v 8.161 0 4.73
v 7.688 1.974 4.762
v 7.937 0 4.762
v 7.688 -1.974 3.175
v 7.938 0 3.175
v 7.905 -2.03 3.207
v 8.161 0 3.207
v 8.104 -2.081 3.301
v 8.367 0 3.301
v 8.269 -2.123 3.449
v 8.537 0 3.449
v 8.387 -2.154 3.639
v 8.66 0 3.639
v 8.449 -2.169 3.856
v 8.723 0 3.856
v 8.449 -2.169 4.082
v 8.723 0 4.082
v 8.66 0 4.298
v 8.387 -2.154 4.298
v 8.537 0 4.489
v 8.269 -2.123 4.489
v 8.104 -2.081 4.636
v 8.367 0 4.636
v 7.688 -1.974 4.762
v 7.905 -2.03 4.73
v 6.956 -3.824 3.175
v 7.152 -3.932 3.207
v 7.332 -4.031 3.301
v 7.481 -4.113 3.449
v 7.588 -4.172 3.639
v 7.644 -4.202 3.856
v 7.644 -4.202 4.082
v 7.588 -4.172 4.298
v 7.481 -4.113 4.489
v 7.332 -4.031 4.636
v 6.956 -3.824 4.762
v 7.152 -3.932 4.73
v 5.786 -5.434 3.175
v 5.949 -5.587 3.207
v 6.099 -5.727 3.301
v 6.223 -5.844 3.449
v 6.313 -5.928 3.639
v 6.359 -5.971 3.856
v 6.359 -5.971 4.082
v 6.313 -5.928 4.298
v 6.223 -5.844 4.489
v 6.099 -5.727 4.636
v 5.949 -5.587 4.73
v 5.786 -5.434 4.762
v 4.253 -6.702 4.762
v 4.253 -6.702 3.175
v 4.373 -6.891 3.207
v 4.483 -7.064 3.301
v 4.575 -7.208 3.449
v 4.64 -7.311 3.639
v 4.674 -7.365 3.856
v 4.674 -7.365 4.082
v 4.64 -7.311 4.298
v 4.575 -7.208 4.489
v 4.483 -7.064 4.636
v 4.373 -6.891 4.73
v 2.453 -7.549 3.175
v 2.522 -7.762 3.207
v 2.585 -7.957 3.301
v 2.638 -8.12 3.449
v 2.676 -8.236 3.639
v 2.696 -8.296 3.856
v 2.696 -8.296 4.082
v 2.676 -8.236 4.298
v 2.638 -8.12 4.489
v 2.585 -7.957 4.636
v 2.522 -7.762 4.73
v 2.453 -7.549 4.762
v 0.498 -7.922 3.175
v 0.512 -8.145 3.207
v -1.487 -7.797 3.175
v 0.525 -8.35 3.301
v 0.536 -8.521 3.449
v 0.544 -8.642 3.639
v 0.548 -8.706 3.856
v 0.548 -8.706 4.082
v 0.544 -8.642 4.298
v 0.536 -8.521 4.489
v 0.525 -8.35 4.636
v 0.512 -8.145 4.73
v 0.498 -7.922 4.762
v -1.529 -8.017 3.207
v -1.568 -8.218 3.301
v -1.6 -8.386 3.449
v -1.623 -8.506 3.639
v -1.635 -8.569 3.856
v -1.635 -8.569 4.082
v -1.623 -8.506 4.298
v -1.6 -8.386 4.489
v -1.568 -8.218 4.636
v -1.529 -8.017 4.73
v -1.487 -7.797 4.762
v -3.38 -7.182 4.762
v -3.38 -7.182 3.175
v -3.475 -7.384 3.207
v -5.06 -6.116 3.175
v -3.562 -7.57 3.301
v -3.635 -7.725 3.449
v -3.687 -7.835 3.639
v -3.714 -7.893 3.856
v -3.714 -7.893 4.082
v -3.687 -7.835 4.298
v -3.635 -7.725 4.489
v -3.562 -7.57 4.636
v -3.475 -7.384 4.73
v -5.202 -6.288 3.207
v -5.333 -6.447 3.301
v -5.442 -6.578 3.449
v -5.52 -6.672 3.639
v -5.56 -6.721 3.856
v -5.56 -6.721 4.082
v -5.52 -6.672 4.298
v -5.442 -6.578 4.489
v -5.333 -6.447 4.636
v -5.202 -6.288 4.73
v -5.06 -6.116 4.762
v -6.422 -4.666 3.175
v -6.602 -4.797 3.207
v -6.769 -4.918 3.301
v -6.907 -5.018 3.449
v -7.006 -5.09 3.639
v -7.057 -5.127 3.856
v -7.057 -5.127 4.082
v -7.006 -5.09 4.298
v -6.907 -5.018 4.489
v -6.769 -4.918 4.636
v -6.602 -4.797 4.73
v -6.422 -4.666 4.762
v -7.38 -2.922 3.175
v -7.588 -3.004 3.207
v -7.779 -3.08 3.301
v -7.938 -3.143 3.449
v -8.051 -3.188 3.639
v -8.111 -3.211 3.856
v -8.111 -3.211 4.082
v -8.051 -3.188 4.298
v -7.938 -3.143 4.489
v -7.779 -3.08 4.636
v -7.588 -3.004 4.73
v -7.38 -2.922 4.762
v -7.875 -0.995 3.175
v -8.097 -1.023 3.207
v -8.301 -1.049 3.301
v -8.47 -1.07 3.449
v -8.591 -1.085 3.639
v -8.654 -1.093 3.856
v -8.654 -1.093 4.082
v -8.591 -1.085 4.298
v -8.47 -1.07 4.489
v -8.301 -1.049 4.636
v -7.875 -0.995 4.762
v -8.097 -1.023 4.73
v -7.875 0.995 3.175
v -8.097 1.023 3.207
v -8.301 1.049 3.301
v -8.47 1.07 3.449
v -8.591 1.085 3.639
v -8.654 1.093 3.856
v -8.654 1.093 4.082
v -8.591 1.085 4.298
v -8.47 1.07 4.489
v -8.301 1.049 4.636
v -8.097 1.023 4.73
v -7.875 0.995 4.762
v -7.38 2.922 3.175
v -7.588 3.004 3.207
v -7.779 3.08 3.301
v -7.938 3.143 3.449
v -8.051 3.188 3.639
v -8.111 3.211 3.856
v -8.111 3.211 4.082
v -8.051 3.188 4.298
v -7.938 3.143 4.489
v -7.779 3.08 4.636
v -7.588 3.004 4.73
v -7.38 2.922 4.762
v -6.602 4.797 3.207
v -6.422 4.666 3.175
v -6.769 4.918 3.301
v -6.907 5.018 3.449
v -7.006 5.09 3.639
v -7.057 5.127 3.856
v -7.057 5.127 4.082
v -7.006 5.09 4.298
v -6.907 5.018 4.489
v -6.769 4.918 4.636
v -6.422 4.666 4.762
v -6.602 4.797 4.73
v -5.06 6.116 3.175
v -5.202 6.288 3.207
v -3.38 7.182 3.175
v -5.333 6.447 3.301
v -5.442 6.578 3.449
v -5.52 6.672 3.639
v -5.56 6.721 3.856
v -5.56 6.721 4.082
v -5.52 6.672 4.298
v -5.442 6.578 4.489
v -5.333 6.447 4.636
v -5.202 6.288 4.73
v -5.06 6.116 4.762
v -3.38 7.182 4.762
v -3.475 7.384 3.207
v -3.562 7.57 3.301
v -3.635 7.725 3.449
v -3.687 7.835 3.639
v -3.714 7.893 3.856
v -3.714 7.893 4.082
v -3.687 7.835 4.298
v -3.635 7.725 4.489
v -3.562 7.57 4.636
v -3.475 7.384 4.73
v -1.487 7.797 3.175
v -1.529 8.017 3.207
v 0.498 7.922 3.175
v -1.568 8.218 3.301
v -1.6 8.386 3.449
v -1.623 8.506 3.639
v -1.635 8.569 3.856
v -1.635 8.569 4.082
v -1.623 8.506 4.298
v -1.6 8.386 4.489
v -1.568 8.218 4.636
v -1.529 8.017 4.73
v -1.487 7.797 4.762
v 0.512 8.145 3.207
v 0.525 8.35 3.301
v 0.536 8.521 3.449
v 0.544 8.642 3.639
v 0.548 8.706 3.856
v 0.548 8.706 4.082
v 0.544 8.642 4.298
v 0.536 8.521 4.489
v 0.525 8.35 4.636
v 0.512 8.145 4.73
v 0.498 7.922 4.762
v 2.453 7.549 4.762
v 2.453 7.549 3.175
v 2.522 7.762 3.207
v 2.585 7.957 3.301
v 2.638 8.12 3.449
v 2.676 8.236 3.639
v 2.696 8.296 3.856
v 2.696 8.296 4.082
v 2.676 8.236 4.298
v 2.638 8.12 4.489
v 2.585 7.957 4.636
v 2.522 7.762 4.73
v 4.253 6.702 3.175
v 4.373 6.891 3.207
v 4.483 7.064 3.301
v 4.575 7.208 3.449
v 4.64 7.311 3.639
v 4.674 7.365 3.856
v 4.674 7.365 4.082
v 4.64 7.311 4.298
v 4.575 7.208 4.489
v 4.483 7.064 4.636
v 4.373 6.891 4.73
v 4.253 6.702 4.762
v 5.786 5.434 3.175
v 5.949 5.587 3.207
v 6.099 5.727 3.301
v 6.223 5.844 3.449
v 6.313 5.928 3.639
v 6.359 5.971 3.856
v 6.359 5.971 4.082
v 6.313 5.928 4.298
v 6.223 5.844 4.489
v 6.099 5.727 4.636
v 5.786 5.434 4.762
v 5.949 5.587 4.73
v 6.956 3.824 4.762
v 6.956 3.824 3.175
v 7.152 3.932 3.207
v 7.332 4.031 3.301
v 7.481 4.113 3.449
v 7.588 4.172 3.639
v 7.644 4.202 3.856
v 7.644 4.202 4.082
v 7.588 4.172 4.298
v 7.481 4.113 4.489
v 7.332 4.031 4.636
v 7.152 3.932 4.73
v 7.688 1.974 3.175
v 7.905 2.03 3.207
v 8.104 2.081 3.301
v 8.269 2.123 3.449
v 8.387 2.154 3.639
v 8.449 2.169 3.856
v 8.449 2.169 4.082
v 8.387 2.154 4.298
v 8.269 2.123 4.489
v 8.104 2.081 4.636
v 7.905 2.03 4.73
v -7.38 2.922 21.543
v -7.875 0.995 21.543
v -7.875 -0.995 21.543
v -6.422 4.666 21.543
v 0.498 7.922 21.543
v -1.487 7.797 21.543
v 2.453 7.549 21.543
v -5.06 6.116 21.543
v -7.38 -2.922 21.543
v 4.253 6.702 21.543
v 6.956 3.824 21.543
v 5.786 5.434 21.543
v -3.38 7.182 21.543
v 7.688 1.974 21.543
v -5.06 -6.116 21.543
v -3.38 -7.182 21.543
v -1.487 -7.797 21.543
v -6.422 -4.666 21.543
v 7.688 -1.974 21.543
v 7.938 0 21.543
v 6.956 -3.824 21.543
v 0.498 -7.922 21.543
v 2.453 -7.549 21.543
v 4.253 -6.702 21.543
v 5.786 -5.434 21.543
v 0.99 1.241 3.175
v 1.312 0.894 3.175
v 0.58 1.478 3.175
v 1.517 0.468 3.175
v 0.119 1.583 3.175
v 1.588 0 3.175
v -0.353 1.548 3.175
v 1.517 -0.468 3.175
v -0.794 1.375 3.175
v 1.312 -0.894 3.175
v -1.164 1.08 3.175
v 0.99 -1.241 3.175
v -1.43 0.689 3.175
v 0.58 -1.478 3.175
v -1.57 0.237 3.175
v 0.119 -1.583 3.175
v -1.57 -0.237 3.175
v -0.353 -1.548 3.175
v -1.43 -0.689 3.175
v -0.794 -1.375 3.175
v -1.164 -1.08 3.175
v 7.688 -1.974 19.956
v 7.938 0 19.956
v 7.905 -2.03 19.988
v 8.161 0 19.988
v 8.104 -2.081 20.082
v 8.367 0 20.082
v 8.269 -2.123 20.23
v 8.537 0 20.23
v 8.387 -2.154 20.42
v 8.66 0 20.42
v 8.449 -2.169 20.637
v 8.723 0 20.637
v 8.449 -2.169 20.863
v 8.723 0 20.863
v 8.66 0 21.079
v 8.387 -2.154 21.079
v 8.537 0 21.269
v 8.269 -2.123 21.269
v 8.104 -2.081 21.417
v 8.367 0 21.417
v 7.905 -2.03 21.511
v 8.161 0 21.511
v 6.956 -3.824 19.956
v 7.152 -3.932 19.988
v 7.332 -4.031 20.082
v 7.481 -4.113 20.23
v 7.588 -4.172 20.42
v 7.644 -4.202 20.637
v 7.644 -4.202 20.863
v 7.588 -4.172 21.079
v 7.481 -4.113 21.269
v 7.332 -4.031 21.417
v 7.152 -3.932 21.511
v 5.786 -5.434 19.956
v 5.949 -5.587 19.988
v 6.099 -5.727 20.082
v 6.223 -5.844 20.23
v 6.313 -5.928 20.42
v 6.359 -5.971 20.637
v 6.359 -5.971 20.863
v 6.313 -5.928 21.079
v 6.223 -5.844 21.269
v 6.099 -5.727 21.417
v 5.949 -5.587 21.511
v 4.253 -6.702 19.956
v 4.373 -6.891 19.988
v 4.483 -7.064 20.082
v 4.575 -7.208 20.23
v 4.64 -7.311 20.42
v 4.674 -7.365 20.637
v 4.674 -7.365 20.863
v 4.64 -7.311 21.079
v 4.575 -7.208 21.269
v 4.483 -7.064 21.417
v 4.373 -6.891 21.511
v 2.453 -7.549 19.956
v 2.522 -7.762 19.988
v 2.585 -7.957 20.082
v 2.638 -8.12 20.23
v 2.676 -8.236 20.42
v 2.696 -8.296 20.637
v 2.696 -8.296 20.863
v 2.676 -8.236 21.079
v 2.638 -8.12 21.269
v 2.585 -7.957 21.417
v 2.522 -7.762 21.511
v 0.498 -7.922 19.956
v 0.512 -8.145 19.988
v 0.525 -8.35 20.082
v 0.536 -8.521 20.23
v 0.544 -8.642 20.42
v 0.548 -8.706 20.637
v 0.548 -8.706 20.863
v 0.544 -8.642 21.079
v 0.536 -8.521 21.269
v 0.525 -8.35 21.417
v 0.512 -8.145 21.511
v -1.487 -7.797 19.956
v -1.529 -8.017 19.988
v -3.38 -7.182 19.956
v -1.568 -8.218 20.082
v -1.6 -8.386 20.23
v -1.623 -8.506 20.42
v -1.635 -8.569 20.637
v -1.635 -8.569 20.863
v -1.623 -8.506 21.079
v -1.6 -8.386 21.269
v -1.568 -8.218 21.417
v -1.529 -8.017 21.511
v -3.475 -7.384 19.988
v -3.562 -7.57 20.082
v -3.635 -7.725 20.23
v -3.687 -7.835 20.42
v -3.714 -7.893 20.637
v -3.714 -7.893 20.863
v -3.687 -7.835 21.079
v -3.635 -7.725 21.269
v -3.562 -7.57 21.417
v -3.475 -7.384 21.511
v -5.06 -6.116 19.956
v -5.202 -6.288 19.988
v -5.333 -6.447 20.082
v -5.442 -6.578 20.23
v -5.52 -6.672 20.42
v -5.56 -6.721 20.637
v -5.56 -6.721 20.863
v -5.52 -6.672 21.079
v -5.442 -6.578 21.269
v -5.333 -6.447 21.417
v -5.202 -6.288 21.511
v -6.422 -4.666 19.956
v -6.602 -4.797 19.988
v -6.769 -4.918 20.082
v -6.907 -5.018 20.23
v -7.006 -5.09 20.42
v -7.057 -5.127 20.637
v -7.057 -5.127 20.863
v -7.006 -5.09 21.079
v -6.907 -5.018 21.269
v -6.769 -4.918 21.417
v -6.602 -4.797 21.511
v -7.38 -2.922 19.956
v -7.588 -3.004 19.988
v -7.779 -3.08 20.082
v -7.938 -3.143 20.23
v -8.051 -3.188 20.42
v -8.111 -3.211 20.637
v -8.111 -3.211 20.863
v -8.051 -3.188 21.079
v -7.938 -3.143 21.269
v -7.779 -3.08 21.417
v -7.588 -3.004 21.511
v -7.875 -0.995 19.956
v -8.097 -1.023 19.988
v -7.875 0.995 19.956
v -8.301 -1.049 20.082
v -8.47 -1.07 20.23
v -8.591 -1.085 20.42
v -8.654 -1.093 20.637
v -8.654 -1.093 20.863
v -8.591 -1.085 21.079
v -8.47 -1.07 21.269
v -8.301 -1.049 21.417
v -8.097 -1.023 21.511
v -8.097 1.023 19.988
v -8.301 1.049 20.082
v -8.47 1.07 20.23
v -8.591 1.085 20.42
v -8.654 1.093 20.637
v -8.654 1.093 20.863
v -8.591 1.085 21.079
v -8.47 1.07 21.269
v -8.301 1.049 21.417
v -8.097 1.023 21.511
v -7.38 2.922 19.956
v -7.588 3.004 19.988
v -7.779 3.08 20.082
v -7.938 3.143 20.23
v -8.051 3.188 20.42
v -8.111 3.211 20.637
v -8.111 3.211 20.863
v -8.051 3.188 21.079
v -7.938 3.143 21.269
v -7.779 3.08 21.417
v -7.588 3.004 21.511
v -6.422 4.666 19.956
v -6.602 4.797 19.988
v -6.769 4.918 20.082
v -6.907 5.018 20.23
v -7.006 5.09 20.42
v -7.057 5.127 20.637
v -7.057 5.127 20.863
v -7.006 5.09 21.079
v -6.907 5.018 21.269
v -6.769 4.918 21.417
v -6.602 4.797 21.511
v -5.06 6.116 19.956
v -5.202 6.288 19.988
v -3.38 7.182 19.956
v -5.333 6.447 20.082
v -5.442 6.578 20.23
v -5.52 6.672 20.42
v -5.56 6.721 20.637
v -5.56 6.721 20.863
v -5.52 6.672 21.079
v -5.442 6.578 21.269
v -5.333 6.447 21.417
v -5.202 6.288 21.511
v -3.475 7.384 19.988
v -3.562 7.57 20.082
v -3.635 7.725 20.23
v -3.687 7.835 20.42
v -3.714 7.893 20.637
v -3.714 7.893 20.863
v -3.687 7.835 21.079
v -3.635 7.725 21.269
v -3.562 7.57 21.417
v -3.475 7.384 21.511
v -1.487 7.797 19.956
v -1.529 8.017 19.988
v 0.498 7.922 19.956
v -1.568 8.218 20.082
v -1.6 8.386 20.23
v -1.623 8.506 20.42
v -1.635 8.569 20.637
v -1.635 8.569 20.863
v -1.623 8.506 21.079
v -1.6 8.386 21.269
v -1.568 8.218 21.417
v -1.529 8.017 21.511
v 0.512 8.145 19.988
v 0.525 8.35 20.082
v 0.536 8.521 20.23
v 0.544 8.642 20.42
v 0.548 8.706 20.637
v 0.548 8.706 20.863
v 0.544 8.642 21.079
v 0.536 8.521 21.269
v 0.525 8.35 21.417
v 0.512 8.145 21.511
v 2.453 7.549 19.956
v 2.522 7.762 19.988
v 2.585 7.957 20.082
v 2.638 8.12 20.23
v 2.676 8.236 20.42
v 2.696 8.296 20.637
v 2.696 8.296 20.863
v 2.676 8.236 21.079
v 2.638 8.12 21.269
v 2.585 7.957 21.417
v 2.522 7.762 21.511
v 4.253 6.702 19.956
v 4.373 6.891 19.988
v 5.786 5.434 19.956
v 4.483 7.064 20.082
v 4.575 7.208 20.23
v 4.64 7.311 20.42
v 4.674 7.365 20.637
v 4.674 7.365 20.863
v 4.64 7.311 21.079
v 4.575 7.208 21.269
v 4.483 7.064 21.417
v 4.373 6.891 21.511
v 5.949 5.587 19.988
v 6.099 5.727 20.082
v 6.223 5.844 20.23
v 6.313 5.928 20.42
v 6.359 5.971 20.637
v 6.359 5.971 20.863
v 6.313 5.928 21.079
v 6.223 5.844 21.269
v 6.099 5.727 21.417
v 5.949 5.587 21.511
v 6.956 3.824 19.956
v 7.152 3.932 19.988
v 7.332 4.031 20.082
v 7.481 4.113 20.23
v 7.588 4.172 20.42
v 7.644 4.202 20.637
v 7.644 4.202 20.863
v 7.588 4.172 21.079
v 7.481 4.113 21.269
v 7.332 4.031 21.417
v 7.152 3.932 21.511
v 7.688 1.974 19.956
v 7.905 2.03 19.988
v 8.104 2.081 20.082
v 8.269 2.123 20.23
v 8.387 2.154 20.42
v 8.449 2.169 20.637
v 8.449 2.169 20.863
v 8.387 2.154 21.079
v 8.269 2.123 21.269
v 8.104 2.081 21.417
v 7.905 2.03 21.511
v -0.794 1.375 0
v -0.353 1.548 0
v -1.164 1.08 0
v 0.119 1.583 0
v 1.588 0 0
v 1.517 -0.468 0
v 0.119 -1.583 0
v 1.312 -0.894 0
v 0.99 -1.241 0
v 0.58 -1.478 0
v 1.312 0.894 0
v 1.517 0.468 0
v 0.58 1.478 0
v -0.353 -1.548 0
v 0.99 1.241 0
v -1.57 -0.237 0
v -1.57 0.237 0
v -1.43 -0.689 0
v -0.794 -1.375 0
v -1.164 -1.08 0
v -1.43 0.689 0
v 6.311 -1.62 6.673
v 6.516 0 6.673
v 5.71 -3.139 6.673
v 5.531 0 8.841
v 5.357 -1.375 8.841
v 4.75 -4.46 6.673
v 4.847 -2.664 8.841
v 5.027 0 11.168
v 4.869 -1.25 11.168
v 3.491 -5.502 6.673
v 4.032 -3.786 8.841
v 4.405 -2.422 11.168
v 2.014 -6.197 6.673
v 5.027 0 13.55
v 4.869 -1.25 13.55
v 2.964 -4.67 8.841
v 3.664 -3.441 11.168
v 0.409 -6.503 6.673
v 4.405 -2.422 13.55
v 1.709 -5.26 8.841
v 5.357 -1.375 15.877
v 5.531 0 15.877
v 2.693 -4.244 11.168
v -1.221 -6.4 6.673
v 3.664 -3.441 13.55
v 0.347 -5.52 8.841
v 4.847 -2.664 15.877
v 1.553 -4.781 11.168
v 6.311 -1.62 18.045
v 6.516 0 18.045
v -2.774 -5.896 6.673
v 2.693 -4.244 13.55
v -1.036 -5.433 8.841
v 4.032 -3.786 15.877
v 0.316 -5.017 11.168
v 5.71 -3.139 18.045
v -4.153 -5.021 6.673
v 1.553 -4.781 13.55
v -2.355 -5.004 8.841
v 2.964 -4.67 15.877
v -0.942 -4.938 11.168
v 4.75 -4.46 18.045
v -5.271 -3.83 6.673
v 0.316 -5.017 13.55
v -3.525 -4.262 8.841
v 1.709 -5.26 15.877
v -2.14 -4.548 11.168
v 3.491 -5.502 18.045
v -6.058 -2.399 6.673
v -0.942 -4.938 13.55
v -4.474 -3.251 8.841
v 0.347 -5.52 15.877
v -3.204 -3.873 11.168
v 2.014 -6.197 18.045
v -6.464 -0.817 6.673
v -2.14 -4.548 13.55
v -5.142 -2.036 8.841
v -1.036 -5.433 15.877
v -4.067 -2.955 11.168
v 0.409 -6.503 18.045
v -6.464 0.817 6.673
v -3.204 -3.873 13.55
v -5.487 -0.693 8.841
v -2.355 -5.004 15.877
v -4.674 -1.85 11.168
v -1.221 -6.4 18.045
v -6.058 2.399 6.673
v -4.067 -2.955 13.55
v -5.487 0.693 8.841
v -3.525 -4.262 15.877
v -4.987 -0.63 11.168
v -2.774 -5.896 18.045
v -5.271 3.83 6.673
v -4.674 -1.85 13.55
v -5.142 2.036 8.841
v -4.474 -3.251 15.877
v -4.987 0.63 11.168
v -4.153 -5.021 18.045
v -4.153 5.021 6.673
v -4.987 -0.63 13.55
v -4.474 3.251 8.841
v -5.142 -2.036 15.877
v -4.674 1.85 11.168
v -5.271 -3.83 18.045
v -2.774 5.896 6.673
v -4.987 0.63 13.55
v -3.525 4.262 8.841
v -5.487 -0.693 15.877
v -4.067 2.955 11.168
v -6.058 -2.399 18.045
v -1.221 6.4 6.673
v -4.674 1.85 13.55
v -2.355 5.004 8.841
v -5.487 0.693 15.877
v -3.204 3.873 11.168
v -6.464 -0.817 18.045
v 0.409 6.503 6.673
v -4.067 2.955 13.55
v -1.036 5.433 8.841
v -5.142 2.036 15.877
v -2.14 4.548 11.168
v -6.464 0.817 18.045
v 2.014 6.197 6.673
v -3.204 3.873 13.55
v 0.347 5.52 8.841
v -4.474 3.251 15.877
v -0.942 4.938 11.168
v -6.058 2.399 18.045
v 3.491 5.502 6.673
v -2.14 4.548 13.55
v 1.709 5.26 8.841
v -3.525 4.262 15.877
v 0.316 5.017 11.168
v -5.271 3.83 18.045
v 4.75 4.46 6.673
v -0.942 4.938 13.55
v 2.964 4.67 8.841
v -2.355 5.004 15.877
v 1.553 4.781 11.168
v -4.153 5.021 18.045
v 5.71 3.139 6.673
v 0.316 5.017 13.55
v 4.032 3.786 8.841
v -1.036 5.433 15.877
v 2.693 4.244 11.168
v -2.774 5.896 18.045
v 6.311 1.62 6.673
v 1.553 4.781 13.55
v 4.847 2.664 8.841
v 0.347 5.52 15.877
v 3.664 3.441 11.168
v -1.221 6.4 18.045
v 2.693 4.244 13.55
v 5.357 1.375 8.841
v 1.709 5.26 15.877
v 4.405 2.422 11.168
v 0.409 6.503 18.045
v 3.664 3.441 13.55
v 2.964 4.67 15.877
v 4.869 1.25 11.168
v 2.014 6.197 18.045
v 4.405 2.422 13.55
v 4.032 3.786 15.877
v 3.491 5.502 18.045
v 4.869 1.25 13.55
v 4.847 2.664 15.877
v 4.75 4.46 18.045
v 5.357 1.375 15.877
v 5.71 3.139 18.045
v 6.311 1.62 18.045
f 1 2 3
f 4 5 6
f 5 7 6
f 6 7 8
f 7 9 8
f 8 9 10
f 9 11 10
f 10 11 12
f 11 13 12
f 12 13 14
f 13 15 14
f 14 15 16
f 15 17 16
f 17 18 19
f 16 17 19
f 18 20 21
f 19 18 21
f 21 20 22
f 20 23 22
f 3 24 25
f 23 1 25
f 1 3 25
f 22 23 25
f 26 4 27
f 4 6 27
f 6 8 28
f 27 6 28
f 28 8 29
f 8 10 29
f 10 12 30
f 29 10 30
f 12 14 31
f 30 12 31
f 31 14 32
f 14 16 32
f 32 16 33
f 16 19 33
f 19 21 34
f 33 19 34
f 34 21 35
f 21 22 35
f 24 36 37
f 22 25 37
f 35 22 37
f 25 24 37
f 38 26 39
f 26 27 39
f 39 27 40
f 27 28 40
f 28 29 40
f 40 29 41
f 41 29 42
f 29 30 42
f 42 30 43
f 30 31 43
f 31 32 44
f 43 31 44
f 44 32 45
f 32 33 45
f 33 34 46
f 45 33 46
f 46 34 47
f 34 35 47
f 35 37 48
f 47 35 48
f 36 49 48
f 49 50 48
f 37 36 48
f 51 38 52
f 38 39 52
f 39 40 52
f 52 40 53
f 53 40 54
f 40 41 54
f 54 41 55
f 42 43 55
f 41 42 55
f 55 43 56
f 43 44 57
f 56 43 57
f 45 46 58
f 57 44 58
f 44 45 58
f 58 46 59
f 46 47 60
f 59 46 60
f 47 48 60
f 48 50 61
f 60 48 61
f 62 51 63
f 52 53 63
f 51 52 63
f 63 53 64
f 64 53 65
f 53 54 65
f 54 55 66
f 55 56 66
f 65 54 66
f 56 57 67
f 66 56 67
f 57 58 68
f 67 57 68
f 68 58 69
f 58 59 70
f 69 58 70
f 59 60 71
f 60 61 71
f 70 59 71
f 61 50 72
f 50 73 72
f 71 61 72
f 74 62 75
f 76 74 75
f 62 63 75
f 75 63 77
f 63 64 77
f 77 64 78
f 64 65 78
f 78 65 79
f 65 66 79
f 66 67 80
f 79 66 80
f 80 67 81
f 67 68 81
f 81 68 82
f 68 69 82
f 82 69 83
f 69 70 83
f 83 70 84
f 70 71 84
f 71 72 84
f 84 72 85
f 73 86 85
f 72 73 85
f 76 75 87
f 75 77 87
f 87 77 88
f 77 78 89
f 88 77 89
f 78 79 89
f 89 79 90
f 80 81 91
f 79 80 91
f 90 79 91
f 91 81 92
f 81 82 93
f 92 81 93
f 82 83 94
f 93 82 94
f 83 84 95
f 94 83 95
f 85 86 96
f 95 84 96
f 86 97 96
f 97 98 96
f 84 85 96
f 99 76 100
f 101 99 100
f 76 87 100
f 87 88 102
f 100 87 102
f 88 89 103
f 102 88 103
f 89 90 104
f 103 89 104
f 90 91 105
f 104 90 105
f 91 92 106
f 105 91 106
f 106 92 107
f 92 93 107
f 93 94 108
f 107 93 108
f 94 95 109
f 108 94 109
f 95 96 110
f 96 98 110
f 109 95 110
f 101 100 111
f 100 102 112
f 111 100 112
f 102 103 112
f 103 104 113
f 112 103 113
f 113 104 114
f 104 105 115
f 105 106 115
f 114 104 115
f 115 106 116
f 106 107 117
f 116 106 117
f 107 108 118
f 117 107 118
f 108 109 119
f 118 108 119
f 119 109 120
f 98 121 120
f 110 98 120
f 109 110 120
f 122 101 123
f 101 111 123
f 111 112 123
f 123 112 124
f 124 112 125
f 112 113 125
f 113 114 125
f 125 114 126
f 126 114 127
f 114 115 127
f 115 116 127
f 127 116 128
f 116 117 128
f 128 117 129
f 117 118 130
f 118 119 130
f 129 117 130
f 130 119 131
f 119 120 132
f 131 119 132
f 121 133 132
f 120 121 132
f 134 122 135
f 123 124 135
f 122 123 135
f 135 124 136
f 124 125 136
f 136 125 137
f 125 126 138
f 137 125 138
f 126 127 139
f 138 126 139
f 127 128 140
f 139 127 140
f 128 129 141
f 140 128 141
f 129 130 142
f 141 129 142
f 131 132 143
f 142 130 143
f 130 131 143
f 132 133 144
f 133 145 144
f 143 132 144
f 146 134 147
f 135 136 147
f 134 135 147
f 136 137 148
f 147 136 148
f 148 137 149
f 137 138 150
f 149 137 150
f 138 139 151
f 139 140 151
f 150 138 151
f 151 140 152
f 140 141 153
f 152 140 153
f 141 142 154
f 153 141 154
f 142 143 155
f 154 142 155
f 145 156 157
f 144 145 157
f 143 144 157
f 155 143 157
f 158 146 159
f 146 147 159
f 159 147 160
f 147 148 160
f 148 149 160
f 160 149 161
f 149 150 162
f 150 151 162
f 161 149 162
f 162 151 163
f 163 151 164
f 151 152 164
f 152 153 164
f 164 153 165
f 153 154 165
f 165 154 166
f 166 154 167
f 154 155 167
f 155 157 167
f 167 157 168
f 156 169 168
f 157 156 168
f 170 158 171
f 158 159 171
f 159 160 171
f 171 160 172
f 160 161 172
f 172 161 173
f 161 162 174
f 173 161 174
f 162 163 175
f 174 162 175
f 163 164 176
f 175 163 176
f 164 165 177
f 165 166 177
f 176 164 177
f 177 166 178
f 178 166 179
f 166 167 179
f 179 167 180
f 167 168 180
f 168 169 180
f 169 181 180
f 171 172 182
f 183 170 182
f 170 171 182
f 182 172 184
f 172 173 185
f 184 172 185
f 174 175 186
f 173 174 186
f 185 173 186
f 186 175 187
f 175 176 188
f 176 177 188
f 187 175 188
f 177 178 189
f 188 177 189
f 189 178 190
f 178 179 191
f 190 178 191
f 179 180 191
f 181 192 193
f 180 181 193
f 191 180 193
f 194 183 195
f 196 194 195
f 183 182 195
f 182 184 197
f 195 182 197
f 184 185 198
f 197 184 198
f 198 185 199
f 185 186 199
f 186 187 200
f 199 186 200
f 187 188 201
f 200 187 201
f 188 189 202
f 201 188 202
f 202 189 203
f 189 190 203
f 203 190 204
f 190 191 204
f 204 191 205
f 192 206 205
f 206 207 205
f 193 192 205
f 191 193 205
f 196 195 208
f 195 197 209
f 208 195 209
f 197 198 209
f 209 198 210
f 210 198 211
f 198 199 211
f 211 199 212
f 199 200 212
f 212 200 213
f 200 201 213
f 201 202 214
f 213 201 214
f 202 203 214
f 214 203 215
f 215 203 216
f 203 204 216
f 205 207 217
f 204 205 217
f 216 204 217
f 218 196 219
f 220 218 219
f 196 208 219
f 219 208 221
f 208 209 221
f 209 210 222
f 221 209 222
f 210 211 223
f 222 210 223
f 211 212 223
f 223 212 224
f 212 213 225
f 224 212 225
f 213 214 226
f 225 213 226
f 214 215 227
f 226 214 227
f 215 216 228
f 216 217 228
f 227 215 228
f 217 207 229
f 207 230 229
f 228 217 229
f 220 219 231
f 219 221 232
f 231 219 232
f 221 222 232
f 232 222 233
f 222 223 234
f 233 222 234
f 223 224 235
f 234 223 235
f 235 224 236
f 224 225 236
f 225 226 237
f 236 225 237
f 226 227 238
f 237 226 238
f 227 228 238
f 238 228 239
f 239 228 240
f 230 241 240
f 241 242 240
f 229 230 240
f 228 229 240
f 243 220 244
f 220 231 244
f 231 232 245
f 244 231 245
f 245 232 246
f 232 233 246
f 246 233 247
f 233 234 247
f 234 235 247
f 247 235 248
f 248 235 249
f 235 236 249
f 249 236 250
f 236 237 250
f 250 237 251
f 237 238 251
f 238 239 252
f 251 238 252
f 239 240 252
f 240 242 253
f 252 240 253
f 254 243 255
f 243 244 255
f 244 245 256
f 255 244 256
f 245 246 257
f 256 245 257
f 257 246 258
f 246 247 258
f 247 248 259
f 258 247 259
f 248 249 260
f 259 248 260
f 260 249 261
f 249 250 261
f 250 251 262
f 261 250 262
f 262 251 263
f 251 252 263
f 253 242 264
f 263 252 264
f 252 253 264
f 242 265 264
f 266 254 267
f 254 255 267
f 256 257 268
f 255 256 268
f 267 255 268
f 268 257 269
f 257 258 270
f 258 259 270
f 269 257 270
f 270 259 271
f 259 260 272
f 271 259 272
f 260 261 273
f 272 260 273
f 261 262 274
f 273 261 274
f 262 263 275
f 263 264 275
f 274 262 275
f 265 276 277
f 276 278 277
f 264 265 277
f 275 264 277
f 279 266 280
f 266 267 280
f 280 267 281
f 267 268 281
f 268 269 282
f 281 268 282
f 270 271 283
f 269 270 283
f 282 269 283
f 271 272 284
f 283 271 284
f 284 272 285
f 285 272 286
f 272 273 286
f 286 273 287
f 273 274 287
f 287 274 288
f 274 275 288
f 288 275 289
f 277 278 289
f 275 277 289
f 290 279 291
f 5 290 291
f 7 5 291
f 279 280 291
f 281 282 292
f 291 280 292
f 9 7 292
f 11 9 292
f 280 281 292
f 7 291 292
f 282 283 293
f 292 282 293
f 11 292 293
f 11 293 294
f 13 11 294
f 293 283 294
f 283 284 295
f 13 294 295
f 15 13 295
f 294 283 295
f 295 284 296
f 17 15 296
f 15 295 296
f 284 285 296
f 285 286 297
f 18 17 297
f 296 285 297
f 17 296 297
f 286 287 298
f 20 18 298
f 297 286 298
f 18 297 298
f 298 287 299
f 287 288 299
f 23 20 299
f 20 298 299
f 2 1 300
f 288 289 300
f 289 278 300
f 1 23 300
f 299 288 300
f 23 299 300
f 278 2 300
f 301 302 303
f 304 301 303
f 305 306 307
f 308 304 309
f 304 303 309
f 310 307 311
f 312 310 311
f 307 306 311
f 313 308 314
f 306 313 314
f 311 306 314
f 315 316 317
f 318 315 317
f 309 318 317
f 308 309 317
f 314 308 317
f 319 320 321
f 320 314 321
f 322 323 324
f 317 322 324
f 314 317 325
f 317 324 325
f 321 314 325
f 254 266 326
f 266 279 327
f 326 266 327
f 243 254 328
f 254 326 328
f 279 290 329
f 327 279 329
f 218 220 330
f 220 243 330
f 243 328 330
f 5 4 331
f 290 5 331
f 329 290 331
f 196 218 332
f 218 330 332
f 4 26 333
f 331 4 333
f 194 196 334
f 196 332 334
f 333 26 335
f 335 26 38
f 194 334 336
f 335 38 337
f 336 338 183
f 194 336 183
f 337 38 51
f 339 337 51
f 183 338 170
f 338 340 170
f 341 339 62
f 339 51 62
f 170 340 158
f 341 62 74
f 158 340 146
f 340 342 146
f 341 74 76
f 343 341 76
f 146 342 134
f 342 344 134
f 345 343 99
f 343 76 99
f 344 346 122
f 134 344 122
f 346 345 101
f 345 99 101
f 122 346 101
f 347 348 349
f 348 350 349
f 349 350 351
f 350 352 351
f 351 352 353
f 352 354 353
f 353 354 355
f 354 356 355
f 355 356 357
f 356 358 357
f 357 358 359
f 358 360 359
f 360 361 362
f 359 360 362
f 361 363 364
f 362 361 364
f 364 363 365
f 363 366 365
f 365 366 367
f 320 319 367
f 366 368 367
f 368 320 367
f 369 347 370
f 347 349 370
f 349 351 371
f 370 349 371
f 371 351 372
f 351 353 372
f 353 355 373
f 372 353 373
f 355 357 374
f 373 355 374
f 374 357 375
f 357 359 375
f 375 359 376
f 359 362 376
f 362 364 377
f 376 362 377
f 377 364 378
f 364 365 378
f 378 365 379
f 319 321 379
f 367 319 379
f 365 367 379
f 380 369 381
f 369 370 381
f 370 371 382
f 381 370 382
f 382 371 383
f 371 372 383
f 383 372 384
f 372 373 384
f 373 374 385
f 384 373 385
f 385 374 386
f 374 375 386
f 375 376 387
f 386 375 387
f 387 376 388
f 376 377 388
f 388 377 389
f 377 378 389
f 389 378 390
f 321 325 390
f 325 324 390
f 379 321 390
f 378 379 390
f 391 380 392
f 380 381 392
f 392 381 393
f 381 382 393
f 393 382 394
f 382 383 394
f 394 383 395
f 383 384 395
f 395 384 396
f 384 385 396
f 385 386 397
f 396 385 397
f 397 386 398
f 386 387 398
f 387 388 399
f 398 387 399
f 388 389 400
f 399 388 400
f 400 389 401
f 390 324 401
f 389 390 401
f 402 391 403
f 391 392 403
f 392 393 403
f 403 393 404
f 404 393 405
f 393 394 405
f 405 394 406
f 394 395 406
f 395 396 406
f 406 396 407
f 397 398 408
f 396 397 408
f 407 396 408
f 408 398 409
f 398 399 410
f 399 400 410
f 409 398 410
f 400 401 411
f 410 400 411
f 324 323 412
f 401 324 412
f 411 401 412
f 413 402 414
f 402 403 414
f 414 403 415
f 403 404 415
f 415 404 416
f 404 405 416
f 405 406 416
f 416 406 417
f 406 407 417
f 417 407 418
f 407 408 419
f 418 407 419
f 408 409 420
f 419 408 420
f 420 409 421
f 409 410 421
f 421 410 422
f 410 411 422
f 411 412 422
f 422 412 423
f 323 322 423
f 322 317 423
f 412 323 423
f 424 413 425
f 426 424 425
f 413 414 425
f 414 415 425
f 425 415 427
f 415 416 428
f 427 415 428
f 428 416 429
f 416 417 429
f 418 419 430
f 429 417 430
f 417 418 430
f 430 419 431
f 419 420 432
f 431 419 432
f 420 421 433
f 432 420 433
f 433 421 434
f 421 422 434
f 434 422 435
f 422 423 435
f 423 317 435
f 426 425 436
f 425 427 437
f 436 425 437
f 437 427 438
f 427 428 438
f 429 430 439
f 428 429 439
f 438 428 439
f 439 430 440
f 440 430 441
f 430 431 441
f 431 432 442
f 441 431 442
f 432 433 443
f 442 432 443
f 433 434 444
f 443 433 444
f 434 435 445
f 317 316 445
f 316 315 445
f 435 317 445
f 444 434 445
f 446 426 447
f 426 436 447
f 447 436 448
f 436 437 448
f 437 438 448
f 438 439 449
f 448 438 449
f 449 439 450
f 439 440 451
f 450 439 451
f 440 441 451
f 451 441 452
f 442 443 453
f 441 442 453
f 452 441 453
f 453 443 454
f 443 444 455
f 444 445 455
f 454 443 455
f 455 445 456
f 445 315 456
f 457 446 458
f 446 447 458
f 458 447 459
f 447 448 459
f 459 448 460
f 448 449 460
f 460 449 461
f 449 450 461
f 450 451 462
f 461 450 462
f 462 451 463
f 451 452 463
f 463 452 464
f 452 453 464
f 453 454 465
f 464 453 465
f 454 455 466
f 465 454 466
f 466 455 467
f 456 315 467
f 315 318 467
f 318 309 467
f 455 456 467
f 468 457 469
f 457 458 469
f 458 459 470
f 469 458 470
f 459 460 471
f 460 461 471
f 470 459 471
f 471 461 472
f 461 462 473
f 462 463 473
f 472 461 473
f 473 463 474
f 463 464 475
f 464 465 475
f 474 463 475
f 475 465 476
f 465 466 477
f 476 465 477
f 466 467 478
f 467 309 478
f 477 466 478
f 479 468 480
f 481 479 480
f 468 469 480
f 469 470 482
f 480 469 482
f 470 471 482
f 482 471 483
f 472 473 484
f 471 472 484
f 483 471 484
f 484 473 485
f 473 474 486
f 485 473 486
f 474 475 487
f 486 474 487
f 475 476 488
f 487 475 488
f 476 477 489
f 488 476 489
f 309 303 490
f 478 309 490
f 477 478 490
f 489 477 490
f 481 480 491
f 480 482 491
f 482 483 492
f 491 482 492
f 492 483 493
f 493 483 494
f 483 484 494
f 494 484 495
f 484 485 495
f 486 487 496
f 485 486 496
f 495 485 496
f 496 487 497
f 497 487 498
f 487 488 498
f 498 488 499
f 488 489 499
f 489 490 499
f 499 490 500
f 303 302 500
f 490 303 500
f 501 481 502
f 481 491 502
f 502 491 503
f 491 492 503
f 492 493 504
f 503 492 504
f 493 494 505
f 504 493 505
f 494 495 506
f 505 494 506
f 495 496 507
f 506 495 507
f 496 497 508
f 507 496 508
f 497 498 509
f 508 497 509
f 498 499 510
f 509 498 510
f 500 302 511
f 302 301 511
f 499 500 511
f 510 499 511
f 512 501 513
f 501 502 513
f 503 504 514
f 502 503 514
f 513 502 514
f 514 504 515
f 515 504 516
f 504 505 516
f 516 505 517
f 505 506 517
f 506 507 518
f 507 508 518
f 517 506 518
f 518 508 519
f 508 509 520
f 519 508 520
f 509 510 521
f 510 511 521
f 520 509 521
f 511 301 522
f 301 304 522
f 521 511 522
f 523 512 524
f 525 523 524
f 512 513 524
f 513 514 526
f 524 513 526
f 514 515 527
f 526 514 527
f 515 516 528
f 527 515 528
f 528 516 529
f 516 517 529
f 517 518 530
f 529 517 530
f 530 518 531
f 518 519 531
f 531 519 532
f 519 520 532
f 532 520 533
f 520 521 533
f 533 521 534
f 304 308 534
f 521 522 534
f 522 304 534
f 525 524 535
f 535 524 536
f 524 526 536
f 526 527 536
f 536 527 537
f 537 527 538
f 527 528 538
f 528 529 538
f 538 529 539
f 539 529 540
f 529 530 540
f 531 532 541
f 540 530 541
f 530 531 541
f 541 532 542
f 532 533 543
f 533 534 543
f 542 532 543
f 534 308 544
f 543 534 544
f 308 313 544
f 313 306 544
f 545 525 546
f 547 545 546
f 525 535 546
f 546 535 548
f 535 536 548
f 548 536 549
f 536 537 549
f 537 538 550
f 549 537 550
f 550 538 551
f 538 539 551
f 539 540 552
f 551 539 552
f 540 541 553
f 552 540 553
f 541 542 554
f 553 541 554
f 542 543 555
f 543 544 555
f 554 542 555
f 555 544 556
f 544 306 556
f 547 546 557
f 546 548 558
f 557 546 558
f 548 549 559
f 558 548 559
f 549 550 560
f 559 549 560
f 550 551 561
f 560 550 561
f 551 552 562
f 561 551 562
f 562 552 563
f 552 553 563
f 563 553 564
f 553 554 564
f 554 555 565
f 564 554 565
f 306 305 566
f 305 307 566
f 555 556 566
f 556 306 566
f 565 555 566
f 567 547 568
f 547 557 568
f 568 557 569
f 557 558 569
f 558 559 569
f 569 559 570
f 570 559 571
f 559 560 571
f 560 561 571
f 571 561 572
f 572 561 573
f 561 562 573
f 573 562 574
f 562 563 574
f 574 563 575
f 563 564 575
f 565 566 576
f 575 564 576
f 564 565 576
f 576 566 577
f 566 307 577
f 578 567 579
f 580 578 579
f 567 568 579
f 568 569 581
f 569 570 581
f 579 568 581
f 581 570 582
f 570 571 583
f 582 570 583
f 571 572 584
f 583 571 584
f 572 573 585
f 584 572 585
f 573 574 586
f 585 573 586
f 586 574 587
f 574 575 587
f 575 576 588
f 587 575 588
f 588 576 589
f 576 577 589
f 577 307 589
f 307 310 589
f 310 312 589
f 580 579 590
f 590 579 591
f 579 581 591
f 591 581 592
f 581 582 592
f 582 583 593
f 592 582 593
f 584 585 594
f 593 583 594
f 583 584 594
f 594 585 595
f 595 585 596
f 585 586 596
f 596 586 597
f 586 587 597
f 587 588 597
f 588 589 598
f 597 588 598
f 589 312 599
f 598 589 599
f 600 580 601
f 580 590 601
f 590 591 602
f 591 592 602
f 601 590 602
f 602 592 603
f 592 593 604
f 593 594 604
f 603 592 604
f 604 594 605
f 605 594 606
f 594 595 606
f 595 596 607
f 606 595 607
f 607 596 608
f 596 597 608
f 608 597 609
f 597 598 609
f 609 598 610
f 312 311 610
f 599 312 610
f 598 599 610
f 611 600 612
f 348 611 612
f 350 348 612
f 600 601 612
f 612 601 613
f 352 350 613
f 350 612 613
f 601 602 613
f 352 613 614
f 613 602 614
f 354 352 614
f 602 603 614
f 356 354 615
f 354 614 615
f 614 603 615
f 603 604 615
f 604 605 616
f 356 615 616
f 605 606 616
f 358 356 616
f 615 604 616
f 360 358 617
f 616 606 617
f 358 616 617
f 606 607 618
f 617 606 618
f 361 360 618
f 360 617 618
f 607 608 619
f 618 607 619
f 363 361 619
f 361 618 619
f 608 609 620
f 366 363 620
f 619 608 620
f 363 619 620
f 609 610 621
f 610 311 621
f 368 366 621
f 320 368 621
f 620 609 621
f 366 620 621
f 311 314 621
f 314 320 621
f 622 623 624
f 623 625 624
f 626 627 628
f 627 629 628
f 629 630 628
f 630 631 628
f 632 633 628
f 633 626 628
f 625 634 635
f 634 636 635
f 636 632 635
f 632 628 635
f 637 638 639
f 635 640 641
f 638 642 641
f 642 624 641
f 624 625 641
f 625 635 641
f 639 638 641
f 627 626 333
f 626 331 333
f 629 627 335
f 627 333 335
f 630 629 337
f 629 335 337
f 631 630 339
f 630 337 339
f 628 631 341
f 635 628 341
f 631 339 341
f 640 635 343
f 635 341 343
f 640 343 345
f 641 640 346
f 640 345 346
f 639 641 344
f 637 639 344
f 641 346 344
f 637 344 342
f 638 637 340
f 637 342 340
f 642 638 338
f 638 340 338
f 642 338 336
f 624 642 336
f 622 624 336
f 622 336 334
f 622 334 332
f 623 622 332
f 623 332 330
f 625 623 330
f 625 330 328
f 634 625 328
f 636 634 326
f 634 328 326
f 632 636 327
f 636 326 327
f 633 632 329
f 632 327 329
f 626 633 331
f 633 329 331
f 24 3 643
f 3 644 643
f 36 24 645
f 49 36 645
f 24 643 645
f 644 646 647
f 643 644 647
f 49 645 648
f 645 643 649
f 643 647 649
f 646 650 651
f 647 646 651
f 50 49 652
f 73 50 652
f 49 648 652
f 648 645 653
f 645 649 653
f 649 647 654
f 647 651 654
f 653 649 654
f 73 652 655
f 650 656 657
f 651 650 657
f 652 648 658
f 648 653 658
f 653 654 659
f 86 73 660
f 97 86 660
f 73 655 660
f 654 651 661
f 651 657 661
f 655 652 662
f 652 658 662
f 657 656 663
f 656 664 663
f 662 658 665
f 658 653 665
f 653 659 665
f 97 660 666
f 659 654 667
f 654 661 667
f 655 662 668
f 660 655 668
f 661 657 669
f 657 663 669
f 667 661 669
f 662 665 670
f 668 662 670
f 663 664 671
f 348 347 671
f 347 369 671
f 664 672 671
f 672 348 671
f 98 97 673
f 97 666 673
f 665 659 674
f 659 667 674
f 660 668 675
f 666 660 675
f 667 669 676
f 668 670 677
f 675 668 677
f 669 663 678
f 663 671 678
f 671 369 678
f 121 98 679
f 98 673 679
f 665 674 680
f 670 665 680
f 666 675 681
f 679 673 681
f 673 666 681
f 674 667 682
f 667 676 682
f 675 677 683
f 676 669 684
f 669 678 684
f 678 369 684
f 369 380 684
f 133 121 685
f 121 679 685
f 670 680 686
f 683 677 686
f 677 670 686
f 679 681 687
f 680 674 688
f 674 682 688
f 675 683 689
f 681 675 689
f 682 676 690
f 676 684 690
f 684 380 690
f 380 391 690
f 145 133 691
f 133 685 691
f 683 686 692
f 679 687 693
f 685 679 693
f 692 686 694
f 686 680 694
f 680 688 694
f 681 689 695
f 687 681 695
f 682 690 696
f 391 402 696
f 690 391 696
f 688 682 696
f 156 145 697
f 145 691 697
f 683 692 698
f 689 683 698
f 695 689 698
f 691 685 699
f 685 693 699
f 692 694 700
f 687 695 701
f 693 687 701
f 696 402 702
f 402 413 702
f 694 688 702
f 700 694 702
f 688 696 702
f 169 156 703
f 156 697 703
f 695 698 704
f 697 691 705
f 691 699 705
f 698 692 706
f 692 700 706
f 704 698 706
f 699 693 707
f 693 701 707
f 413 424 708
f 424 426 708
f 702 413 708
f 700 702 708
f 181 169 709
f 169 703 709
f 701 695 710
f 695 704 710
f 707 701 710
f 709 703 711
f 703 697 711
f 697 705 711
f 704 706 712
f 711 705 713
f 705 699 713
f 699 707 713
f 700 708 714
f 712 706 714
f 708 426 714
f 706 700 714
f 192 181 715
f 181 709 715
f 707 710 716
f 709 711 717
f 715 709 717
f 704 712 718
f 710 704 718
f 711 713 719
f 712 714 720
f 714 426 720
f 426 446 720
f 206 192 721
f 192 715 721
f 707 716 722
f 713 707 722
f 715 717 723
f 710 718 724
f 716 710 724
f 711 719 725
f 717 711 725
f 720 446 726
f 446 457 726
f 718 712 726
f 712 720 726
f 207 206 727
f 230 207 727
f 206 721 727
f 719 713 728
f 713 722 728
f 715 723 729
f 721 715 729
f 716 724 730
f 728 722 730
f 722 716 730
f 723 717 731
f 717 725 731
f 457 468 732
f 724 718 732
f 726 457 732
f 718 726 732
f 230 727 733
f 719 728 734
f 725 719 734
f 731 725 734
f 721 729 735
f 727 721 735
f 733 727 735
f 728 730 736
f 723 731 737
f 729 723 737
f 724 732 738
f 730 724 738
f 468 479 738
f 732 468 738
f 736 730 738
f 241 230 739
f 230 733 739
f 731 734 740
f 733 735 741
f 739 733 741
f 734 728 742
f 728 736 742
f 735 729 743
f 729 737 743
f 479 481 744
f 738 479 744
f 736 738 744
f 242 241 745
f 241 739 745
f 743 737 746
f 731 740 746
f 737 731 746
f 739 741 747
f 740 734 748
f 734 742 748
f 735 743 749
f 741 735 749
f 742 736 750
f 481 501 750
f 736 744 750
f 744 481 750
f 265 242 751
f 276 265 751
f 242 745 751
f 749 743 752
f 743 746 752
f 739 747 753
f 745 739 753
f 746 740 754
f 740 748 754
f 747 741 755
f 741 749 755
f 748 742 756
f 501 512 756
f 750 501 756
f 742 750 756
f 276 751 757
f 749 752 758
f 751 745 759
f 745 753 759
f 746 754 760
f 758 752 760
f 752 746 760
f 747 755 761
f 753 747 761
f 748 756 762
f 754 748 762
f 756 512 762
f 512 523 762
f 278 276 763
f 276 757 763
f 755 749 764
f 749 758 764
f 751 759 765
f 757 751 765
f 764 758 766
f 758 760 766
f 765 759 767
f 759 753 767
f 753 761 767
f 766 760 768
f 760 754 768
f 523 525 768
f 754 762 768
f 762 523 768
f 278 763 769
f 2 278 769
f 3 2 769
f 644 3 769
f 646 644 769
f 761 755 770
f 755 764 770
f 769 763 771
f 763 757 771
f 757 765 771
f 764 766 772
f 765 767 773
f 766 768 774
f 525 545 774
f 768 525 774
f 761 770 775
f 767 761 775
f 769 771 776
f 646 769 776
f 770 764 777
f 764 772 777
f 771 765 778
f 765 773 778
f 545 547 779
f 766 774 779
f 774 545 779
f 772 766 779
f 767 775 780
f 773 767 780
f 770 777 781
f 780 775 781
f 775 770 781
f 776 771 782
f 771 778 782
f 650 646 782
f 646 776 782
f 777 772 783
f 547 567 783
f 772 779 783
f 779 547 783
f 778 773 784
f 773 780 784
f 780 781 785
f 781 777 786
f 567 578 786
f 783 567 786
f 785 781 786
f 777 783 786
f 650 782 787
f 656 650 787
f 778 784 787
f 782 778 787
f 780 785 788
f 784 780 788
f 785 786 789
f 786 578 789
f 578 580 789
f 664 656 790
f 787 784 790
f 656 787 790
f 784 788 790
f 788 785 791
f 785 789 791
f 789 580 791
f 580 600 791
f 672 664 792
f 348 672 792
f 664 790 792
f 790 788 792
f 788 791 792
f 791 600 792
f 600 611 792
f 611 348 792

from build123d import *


with BuildPart() as f1:
    # F0 (on Front) → F1 (revolve)
    with BuildSketch(Plane.XZ):
        with BuildLine():
            Line((0, 21.543375), (0, 0))
            Line((0, 0), (1.5875, 0))
            Line((1.5875, 0), (1.5875, 3.175))
            Line((1.5875, 3.175), (7.9375, 3.175))
            ThreePointArc((7.9375, 3.175), (8.73125, 3.96875), (7.9375, 4.7625))
            ThreePointArc((7.9375, 4.7625), (4.963216, 12.359188), (7.9375, 19.955875))
            ThreePointArc((7.9375, 19.955875), (8.73125, 20.749625), (7.9375, 21.543375))
            Line((7.9375, 21.543375), (0, 21.543375))
        make_face()
    revolve(axis=Axis((0, 0, 10.771688), (0, 0, -1)))


solid = f1.part
